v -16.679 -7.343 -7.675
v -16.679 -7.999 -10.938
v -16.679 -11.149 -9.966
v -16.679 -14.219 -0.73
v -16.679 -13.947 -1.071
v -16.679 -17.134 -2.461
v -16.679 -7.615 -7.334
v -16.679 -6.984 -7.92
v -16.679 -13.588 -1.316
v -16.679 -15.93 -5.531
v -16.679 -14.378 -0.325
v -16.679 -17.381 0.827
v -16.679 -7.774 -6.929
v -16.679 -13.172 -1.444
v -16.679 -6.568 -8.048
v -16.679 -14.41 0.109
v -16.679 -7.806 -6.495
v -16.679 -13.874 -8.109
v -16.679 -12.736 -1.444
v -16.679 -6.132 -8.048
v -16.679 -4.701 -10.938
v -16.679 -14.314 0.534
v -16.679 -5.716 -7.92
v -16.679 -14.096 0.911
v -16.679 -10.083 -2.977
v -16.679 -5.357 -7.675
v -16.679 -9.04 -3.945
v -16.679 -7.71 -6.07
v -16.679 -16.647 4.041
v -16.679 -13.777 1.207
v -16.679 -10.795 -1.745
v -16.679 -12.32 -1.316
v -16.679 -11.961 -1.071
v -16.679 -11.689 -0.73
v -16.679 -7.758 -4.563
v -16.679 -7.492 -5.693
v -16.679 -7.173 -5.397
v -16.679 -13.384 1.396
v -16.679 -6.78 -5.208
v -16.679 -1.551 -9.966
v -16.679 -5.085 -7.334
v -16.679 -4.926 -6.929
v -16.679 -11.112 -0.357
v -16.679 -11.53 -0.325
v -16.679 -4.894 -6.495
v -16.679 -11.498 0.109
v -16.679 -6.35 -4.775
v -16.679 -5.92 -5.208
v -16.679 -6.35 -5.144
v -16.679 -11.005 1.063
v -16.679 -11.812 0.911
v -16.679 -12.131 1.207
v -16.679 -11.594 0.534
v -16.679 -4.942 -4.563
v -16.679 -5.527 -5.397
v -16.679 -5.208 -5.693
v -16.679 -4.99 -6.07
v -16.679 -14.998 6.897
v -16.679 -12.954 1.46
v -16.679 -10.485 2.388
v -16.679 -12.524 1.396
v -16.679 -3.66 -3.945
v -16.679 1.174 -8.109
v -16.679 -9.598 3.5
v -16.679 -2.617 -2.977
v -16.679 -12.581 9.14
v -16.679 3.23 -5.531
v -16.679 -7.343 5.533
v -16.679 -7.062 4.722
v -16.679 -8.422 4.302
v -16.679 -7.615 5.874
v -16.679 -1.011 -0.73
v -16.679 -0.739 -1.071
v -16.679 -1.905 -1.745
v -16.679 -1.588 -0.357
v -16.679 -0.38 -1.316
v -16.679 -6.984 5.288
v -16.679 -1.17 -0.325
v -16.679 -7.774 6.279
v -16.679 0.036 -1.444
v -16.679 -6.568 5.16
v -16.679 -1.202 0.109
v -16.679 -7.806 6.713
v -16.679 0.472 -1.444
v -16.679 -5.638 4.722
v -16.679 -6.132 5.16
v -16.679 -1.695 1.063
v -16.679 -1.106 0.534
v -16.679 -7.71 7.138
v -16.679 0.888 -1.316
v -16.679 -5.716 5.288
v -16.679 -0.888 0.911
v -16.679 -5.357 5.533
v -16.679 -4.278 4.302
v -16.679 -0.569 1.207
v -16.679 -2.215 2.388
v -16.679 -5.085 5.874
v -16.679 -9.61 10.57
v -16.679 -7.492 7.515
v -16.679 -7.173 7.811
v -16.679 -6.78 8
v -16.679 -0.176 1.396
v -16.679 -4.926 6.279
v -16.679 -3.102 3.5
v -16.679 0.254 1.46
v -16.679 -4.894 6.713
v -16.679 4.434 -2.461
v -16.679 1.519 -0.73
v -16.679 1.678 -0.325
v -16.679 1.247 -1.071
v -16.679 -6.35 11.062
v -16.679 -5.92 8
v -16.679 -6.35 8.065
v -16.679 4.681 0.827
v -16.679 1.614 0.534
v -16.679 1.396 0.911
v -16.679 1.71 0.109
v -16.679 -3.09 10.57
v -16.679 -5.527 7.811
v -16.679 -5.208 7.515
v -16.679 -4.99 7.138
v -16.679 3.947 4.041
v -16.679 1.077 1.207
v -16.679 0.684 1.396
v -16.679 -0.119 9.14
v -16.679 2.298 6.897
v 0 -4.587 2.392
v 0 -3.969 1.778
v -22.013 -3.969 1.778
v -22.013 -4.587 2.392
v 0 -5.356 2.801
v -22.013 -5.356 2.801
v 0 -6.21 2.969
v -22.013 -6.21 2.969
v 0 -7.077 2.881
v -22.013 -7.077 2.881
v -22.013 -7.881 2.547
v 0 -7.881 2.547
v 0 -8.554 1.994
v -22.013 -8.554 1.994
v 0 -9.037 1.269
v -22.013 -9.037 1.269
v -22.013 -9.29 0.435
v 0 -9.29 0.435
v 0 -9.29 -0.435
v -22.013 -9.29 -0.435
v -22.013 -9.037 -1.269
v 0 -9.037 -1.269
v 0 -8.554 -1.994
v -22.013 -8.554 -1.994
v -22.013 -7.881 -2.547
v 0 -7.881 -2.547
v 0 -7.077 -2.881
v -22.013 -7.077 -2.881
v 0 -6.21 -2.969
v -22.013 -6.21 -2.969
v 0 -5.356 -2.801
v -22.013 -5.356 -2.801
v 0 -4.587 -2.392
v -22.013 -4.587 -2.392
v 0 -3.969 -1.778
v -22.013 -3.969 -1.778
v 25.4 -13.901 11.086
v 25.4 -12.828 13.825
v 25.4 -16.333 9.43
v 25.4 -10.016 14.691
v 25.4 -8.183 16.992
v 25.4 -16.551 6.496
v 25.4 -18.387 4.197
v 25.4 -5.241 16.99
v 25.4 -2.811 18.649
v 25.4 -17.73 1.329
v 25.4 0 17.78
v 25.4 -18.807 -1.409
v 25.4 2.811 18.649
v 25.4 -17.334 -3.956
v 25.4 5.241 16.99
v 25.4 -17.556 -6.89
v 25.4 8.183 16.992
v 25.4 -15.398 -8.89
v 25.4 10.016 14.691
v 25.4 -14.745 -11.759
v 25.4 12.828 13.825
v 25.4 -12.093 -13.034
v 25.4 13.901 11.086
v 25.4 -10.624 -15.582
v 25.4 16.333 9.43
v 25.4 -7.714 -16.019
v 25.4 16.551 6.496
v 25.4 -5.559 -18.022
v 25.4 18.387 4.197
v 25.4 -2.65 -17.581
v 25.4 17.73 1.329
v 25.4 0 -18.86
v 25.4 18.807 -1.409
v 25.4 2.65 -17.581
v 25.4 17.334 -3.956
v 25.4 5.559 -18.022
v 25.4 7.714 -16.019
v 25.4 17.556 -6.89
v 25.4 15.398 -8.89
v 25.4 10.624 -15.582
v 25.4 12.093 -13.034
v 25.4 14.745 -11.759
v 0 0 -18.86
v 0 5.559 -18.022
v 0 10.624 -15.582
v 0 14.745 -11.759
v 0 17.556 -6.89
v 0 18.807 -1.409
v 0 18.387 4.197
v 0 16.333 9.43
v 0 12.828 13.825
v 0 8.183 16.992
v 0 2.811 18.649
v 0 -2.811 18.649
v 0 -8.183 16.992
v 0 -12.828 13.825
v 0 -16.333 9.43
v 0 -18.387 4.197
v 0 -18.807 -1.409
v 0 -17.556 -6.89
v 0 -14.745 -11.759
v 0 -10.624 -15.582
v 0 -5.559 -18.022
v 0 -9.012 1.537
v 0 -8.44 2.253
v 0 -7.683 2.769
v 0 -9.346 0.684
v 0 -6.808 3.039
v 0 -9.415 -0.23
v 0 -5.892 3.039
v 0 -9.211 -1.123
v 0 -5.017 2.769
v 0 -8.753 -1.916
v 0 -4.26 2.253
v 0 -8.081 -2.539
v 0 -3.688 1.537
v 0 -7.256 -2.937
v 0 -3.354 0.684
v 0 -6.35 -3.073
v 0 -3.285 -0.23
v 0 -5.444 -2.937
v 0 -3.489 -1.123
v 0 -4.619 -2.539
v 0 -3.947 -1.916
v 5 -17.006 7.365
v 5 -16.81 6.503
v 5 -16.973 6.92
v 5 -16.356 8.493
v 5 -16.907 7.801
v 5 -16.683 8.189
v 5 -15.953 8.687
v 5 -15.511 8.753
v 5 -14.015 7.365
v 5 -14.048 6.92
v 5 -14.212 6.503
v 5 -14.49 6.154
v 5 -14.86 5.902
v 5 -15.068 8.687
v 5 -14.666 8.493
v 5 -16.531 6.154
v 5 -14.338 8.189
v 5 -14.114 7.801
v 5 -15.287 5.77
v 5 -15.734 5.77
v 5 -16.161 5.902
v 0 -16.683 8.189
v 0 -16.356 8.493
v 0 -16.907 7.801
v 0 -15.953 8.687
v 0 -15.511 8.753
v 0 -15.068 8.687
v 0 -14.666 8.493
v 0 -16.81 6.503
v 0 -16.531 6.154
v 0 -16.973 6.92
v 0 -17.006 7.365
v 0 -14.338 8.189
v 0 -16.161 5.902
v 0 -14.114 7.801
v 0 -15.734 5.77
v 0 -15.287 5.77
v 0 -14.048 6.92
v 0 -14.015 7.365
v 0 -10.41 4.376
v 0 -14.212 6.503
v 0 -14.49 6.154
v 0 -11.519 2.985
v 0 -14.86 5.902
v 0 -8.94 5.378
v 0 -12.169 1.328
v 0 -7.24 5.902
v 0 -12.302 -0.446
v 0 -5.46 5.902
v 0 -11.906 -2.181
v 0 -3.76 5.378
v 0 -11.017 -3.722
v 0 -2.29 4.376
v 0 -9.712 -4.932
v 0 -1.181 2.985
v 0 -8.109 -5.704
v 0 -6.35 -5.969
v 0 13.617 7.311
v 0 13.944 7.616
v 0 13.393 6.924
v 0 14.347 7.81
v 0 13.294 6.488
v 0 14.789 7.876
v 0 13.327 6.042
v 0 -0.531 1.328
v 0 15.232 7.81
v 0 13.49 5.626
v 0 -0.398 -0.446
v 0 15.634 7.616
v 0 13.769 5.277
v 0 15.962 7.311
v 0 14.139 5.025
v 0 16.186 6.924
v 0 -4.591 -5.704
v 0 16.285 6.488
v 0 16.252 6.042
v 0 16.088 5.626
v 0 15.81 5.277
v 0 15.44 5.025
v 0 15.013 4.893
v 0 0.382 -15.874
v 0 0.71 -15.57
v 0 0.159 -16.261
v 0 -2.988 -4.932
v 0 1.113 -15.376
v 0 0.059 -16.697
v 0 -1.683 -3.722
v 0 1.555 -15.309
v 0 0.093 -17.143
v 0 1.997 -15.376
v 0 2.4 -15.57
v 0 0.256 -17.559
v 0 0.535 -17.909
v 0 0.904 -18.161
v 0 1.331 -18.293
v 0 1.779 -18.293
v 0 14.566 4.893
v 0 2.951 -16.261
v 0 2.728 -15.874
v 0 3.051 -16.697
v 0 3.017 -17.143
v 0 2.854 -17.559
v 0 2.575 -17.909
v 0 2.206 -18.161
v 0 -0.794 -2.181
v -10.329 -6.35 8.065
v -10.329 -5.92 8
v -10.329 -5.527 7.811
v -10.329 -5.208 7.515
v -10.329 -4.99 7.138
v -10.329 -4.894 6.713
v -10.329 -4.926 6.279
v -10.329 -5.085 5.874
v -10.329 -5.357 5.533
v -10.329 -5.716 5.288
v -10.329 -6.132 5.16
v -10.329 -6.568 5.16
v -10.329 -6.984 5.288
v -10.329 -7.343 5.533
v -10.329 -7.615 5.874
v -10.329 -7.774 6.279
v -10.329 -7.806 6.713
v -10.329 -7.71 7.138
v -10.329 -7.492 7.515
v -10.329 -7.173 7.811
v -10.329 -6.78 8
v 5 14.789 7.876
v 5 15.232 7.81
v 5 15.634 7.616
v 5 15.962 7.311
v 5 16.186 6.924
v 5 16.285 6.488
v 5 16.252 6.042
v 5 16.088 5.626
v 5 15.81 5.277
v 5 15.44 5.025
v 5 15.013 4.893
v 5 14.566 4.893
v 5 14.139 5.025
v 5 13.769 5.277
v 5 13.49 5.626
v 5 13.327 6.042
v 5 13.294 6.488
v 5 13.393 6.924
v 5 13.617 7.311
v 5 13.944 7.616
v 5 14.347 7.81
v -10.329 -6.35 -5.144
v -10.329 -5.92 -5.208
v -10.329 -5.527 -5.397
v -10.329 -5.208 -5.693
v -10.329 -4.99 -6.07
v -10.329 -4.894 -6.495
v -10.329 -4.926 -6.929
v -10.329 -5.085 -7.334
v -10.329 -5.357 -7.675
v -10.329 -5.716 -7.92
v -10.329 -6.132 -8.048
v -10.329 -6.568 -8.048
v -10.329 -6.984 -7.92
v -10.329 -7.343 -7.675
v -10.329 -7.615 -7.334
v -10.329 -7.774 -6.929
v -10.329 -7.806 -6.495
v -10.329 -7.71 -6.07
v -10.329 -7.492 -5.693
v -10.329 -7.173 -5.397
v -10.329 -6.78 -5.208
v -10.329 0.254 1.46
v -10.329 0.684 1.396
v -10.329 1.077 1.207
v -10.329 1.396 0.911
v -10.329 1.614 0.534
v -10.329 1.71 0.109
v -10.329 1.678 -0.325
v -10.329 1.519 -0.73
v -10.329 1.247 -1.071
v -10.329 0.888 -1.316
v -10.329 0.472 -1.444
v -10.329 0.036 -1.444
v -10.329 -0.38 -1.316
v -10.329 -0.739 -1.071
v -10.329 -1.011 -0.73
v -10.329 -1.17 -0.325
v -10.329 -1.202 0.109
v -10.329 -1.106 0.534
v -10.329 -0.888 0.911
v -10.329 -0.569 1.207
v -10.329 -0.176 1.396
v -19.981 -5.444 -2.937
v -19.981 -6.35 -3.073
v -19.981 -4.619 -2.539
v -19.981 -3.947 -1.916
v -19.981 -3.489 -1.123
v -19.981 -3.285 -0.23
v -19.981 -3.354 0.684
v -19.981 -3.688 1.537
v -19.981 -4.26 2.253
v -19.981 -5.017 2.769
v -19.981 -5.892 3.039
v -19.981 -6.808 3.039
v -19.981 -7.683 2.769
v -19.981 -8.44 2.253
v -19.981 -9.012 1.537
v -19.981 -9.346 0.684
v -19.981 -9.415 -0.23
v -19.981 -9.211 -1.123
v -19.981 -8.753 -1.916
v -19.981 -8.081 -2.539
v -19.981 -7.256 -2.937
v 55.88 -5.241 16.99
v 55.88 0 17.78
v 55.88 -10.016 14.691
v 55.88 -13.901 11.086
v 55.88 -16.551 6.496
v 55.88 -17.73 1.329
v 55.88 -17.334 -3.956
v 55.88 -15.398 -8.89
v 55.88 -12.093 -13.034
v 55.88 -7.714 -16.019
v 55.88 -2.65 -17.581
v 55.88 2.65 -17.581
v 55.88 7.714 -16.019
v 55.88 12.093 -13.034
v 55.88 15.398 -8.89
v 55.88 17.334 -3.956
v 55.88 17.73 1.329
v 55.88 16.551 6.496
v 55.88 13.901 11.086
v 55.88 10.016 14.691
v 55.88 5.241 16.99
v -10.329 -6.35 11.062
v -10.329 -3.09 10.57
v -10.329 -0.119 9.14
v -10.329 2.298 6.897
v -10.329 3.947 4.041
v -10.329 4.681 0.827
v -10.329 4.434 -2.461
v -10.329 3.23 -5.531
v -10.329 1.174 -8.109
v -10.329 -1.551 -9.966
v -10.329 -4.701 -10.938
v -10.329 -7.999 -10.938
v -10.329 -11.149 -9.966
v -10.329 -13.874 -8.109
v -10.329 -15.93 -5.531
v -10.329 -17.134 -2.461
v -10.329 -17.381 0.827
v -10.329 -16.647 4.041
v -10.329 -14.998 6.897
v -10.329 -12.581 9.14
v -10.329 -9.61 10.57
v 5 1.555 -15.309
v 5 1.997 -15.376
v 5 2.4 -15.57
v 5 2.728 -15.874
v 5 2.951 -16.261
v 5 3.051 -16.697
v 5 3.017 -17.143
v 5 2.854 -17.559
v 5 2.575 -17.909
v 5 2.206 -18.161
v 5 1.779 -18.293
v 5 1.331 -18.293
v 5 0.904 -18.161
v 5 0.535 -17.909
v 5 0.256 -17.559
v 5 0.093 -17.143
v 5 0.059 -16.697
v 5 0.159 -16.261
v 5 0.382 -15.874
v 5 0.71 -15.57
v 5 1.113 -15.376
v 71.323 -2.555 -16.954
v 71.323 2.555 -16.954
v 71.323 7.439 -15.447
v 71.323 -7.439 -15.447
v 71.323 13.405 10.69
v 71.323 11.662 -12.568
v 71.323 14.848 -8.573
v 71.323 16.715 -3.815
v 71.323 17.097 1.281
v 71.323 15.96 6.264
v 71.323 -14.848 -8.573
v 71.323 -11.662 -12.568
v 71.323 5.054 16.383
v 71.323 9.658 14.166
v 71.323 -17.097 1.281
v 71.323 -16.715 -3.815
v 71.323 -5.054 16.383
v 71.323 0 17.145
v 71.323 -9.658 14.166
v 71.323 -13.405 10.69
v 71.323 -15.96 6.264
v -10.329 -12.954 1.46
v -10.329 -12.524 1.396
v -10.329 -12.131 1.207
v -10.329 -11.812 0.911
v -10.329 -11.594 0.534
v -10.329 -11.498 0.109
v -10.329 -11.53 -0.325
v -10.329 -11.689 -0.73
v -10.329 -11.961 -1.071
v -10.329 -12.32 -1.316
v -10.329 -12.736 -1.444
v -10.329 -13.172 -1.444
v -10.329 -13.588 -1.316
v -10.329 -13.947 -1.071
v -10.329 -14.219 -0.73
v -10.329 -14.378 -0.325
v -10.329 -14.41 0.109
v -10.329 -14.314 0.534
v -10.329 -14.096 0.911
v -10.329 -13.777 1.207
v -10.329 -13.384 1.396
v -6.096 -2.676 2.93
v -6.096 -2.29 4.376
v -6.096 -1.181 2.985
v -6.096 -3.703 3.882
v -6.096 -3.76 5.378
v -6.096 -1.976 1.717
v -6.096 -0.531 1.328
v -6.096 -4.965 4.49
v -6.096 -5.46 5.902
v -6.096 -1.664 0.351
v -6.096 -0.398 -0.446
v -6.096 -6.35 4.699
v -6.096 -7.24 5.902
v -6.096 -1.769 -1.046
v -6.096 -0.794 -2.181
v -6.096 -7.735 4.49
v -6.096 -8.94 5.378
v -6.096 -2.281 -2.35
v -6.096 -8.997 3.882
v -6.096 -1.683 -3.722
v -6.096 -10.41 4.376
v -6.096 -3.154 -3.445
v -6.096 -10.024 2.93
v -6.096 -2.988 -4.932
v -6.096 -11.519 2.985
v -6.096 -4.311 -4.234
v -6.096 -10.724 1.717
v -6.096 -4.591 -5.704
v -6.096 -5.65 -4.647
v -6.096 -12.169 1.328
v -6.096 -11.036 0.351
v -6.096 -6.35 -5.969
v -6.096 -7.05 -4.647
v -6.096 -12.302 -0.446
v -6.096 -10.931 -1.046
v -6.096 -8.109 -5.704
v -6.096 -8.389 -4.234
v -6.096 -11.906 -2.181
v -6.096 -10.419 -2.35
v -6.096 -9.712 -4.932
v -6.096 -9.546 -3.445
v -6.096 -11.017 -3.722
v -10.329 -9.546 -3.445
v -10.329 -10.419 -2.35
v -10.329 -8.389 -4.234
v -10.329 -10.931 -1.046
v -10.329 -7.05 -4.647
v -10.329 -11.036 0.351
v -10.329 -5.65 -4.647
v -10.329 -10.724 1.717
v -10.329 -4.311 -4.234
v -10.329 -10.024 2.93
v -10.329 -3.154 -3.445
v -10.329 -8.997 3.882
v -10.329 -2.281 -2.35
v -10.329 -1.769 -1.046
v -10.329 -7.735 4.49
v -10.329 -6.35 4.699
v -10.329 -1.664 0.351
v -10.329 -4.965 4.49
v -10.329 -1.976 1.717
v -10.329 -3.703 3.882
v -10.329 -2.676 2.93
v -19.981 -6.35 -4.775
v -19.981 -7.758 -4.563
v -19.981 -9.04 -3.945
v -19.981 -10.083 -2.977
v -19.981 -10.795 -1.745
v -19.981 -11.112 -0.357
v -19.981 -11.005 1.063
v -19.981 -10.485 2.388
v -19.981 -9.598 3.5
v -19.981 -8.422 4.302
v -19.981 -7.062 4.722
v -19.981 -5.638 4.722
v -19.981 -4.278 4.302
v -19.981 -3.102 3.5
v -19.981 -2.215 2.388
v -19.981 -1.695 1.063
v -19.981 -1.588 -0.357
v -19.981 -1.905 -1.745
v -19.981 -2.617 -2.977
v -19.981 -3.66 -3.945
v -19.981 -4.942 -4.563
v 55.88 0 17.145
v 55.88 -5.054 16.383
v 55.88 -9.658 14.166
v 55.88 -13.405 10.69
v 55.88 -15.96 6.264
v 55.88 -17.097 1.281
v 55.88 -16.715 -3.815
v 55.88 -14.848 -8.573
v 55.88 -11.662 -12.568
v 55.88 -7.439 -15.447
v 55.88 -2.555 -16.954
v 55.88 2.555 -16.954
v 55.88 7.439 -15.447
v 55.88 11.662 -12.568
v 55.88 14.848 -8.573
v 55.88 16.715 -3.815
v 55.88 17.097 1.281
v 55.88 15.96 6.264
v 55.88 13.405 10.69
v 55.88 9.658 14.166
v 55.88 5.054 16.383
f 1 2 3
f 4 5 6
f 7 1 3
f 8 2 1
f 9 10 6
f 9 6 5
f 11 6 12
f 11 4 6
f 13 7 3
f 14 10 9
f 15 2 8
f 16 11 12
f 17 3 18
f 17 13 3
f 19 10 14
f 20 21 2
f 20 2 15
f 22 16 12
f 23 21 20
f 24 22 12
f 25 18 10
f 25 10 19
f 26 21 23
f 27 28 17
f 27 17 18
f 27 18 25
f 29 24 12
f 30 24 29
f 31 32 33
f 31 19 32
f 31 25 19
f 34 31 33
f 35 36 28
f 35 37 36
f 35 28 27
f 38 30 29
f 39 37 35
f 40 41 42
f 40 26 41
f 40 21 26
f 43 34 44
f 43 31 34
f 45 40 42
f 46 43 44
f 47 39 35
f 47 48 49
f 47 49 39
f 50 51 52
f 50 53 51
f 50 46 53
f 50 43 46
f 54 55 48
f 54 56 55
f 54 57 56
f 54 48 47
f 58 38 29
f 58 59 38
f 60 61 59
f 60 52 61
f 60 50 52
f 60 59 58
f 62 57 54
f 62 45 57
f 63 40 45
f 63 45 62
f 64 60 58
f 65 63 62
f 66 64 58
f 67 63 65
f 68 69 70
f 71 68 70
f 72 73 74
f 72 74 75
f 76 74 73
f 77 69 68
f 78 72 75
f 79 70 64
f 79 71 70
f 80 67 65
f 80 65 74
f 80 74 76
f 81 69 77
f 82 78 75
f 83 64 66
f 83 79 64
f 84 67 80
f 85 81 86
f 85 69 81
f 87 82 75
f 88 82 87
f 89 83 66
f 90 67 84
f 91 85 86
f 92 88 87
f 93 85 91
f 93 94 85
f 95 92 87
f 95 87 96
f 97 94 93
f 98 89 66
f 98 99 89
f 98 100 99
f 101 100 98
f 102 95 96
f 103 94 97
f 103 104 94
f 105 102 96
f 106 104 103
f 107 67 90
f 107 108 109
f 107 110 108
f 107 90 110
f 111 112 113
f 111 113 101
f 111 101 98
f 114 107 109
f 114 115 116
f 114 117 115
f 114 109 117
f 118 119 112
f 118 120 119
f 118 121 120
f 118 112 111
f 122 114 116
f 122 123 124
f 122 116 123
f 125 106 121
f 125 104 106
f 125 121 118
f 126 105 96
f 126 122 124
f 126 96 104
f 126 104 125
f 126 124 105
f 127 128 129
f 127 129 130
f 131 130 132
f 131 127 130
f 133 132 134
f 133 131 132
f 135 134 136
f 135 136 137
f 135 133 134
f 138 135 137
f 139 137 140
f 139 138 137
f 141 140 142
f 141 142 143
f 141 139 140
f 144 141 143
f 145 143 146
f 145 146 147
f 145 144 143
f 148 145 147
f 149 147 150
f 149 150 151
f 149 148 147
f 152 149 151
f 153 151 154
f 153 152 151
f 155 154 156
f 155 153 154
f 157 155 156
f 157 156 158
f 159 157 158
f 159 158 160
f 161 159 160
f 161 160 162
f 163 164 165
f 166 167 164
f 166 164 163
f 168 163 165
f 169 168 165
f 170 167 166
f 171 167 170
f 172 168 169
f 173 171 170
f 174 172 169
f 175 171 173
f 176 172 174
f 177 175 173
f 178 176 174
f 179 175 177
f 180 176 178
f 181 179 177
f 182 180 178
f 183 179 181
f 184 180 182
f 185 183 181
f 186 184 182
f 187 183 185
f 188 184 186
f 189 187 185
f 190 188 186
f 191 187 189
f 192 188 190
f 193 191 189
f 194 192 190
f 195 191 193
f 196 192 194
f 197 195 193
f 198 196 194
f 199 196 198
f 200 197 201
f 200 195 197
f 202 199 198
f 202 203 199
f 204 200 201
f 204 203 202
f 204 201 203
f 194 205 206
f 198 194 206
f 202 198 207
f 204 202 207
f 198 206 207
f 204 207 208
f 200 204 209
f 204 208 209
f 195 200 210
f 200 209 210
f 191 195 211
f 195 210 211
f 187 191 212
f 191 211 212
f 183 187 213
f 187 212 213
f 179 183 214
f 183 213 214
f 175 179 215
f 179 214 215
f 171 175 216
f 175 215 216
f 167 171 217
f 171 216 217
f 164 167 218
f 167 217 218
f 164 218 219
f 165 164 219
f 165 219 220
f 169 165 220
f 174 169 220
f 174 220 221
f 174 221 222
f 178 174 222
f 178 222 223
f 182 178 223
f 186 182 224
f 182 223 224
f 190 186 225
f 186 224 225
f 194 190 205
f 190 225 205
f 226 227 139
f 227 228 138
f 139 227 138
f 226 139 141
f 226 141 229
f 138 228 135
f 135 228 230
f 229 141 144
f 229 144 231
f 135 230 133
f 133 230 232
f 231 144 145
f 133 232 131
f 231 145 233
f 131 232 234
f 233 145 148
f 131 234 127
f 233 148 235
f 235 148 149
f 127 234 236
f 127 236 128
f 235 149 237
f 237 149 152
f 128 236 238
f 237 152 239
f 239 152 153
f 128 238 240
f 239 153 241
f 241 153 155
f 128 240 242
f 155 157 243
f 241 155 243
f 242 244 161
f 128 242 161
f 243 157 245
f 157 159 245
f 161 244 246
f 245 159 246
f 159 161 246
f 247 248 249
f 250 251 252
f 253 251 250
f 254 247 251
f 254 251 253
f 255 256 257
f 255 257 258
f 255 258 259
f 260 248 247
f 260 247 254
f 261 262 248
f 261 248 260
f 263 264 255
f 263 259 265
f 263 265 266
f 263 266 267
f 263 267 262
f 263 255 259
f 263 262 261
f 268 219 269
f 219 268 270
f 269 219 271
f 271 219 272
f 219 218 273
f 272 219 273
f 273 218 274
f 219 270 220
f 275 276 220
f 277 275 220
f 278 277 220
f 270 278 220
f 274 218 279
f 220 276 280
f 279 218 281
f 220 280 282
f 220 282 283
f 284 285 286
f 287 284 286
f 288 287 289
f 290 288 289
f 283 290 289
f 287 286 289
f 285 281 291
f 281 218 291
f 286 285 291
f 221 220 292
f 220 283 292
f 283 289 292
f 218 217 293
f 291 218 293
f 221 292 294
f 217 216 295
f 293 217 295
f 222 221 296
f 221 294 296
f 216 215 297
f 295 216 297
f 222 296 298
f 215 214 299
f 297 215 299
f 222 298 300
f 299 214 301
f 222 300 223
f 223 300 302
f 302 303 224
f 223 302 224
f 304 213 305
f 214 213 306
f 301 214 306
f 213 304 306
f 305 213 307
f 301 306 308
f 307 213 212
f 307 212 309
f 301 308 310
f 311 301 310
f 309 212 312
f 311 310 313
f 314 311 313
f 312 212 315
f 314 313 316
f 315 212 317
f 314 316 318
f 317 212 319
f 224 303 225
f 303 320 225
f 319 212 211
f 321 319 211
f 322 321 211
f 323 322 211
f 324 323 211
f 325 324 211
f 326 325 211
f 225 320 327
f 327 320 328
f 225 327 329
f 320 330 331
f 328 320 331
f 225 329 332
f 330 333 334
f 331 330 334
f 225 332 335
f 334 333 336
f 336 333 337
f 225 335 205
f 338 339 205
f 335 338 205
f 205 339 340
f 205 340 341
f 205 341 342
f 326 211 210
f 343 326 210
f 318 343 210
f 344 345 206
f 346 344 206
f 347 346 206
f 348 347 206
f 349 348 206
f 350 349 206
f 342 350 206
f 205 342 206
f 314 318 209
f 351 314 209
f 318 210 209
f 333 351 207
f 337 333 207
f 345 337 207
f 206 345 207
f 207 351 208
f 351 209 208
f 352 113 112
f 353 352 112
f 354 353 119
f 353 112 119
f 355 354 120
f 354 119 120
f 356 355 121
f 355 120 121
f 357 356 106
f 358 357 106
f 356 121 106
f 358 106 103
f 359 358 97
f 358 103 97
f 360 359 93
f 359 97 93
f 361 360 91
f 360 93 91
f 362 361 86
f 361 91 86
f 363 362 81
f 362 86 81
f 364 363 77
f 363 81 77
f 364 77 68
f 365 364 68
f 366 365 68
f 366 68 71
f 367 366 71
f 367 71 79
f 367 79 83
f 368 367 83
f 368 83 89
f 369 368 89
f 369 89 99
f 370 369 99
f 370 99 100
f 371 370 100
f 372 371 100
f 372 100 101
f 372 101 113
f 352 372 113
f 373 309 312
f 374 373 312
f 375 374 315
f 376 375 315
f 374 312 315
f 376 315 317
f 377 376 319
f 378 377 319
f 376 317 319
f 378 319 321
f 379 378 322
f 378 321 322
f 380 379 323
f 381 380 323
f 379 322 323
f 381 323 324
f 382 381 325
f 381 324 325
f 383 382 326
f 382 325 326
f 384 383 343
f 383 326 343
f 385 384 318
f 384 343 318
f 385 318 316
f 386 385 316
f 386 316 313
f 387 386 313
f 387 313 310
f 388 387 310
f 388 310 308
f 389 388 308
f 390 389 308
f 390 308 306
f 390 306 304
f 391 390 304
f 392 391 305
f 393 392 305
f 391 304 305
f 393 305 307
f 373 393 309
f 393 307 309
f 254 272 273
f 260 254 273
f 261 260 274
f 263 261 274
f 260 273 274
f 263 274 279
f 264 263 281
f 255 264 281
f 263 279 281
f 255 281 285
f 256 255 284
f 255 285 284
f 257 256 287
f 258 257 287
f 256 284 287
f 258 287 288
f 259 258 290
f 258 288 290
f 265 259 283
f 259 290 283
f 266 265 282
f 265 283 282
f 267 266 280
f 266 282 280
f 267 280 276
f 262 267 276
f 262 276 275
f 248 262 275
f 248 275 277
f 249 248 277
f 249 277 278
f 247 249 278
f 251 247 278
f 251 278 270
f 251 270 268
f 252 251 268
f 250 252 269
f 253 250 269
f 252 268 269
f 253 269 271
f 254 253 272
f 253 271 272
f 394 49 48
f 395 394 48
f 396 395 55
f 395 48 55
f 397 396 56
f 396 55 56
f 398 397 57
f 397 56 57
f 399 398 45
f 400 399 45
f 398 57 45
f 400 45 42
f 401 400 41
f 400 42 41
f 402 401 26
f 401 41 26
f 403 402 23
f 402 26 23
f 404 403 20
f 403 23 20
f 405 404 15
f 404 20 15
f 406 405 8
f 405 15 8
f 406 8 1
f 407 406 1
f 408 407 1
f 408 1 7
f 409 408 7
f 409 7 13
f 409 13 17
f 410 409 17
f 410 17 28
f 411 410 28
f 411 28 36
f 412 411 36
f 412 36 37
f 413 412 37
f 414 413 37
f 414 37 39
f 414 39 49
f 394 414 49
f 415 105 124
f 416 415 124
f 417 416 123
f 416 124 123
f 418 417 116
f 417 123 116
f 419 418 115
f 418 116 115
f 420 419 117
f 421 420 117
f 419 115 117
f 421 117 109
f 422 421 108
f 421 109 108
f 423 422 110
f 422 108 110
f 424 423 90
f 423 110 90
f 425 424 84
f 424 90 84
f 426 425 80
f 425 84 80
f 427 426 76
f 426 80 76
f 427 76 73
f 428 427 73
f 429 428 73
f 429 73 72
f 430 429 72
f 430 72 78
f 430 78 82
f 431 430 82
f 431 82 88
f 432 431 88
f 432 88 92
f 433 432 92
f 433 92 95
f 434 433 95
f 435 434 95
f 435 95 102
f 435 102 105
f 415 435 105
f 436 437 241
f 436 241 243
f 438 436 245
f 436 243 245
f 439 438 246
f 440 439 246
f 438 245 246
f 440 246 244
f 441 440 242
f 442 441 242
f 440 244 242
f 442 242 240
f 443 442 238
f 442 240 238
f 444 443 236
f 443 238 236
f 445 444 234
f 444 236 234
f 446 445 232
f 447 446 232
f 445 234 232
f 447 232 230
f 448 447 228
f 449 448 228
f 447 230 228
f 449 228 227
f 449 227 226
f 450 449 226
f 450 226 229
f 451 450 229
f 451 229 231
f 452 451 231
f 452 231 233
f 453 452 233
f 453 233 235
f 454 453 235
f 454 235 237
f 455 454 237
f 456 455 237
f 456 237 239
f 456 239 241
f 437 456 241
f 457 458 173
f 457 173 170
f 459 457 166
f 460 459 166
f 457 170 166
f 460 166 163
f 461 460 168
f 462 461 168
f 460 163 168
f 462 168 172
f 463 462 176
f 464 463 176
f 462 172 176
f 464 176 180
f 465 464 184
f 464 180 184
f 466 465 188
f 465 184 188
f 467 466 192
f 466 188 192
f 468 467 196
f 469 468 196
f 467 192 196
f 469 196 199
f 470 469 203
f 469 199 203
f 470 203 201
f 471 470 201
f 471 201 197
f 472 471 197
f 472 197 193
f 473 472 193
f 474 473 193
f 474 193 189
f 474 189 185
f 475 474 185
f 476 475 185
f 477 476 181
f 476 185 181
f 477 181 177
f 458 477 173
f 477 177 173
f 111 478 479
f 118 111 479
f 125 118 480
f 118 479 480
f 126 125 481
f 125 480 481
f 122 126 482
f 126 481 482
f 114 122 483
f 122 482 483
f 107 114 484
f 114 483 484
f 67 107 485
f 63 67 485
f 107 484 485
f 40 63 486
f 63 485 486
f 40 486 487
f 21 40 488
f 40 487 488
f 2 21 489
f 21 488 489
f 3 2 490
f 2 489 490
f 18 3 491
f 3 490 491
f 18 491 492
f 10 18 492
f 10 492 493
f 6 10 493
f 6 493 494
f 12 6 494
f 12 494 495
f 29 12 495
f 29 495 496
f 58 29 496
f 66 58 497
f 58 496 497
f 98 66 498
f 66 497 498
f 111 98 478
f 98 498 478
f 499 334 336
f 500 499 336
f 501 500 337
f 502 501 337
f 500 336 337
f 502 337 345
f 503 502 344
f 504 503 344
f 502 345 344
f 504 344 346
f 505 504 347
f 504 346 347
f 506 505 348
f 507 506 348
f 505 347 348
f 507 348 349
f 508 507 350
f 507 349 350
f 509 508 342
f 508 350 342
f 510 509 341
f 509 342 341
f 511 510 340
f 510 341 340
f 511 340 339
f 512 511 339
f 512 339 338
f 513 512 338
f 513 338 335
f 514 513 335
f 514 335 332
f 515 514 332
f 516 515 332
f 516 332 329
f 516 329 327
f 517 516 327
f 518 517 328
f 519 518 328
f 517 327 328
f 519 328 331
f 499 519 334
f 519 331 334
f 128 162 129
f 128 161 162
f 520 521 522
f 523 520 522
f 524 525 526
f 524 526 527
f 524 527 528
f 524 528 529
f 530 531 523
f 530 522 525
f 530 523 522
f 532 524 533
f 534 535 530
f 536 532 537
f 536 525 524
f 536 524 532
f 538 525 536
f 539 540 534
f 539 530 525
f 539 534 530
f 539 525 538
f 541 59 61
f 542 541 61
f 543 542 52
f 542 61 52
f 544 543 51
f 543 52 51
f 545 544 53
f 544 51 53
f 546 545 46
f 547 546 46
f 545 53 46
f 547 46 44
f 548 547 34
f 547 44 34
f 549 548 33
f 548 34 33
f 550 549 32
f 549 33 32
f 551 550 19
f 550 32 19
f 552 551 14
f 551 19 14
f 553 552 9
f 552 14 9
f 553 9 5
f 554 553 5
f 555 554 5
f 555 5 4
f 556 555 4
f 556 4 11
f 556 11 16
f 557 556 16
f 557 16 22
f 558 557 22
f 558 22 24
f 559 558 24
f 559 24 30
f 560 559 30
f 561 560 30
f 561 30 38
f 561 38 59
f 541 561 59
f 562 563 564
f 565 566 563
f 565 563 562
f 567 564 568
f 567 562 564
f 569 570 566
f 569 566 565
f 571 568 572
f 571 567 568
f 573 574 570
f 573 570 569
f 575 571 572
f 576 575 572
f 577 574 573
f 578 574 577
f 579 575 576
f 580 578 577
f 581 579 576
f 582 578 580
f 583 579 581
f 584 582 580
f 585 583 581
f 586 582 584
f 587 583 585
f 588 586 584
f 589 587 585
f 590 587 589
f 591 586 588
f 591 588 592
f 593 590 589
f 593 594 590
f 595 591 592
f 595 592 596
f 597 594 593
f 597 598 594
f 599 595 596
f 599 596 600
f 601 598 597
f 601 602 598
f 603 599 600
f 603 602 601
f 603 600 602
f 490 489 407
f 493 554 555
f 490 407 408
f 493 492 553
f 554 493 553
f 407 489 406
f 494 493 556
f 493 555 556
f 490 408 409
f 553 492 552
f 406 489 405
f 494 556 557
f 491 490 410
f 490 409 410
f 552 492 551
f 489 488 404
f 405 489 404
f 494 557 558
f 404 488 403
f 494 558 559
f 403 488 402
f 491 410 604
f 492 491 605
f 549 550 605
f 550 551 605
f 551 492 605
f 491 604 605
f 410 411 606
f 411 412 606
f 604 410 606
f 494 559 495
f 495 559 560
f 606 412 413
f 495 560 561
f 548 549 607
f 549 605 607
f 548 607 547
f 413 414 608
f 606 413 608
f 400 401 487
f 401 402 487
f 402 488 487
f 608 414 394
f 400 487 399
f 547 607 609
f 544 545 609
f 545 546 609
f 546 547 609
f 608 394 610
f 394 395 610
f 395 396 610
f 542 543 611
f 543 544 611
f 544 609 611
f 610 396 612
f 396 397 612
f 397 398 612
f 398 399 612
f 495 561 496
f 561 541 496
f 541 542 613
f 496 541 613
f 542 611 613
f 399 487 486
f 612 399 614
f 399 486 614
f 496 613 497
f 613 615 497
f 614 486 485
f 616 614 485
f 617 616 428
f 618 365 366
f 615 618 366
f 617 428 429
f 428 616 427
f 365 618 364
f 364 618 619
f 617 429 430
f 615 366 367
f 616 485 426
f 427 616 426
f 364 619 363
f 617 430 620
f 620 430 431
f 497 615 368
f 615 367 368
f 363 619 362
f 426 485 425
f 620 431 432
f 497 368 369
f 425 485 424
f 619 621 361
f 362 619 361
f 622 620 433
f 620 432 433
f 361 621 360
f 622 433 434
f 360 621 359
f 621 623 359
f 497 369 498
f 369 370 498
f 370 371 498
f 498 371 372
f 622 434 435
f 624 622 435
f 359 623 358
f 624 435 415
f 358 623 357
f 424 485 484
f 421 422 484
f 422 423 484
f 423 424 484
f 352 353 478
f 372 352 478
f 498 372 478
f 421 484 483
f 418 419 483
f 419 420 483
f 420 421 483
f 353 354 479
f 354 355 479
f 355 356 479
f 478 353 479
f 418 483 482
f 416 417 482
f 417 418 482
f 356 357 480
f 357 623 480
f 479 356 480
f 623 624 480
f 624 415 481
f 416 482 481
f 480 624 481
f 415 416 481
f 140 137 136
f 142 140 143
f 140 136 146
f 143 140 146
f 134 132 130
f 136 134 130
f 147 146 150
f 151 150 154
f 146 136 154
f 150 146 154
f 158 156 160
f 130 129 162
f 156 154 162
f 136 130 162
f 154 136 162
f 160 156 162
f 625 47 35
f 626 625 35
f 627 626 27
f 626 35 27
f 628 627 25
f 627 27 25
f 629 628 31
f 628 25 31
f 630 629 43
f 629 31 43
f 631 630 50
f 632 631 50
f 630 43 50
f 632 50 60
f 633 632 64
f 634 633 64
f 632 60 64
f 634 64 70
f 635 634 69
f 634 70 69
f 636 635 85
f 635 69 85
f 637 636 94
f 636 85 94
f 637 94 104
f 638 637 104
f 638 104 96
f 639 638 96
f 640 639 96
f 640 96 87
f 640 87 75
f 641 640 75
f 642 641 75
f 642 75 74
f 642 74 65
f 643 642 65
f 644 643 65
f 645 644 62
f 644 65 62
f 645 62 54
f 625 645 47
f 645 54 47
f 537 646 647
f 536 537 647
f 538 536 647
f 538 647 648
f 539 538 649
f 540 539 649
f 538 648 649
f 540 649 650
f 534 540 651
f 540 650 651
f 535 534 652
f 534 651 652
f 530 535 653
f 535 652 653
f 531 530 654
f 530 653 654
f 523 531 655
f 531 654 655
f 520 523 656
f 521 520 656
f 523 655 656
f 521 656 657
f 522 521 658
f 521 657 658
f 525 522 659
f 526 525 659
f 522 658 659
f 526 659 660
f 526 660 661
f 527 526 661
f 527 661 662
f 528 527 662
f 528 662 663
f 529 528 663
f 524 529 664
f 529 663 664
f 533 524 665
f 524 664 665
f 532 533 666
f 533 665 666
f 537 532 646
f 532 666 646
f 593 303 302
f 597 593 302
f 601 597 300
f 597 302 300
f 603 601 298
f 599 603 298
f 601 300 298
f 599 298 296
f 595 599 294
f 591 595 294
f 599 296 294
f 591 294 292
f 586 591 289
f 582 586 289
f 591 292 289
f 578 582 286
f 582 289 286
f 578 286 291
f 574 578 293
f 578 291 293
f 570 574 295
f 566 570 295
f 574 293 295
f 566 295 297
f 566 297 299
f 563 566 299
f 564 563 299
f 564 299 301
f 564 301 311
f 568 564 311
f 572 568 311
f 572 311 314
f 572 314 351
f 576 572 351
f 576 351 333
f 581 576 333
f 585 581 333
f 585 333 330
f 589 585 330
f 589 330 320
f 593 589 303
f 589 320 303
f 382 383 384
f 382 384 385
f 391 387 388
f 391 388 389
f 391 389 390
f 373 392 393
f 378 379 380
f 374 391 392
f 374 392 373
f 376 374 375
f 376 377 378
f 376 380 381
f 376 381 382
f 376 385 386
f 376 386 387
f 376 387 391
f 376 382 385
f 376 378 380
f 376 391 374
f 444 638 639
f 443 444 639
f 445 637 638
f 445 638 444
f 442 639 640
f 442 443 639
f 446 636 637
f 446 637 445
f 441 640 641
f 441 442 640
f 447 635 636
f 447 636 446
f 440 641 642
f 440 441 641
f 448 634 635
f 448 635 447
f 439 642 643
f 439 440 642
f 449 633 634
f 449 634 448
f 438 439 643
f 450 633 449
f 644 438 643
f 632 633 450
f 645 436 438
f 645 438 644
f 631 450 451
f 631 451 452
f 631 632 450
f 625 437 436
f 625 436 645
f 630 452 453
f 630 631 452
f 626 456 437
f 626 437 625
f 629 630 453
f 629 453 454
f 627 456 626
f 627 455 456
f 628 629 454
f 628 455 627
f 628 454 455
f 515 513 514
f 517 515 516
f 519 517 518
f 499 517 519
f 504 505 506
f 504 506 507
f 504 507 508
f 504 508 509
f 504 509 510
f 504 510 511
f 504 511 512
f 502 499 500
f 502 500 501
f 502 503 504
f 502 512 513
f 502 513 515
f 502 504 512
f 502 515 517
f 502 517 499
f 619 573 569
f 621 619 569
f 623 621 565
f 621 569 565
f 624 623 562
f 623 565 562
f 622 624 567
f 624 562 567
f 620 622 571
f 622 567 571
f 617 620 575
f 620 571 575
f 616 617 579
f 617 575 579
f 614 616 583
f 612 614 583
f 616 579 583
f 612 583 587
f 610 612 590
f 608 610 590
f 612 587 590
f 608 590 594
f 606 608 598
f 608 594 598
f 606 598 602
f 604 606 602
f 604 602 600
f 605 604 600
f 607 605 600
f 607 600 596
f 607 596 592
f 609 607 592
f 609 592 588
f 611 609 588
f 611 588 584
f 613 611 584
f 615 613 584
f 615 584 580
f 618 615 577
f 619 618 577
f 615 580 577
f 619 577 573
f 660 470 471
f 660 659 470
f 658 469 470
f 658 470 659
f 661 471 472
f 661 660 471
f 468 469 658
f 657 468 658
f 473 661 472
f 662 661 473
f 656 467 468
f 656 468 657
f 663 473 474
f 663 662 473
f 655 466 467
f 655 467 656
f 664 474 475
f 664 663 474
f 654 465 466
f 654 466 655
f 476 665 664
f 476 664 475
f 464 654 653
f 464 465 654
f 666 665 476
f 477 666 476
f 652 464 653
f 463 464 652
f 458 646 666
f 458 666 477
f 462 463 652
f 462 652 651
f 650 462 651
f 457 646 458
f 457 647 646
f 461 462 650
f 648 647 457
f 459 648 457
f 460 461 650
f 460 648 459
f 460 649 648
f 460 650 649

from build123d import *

# Parameters (mm, degrees)
ESQUISSE6_R                                   = 18.8595
BOSS_EXTRU_2_DEPTH                            = 25.4
ESQUISSE7_R                                   = 17.78
BOSS_EXTRU_3_DEPTH                            = 30.48
ESQUISSE8_R                                   = 17.145
BOSS_EXTRU_4_DEPTH                            = 15.4432
ESQUISSE9_R                                   = 5.969
BOSS_EXTRU_5_DEPTH                            = 6.096
ESQUISSE10_R                                  = 4.699
BOSS_EXTRU_6_DEPTH                            = 4.233333333
ESQUISSE11_R                                  = 11.0617
BOSS_EXTRU_7_DEPTH                            = 6.35
ESQUISSE12_R                                  = 4.7752
BOSS_EXTRU_8_DEPTH                            = 3.302
PER_AGE_POUR_TUYAU_POUR_TROU_TARAUD_1_1_D     = 6.1468
PER_AGE_POUR_TUYAU_POUR_TROU_TARAUD_1_1_DEPTH = 19.981333333
BOSS_EXTRU_9_DEPTH                            = 19.981333333
BOSS_EXTRU_10_DEPTH                           = 2.032
ENL_V_MAT_EXTRU_2_REACH                       = 93.955
ESQUISSE18_R                                  = 1.4605
ESQUISSE19_R                                  = 1.5
ESQUISSE19_R_2                                = 1.500000048
ENL_V_MAT_EXTRU_3_DEPTH                       = 5


with BuildPart() as part:
    # Esquisse6 → Boss.-Extru.2 (new body)
    with BuildSketch(Plane(origin=(0, 0, 0), x_dir=(0, 0, -1), z_dir=(1, 0, 0))):
        Circle(ESQUISSE6_R)
    extrude(amount=BOSS_EXTRU_2_DEPTH)

    # Esquisse7 → Boss.-Extru.3 (add)
    with BuildSketch(Plane(origin=(25.4, 0, 0), x_dir=(0, 0, -1), z_dir=(1, 0, 0))):
        with Locations(Location((0, 0, 0), (0, 0, 180))):
            Circle(ESQUISSE7_R)
    extrude(amount=BOSS_EXTRU_3_DEPTH)

    # Esquisse8 → Boss.-Extru.4 (add)
    with BuildSketch(Plane(origin=(55.88, 0, 0), x_dir=(0, 0, -1), z_dir=(1, 0, 0))):
        with Locations(Location((0, 0, 0), (0, 0, 180))):
            Circle(ESQUISSE8_R)
    extrude(amount=BOSS_EXTRU_4_DEPTH)

    # Esquisse9 → Boss.-Extru.5 (add)
    with BuildSketch(Plane.ZY):
        with Locations(Location((0, -6.35, 0), (0, 0, 180))):
            Circle(ESQUISSE9_R)
    extrude(amount=BOSS_EXTRU_5_DEPTH)

    # Esquisse10 → Boss.-Extru.6 (add)
    with BuildSketch(Plane.ZY.offset(6.096)):
        with Locations((0, -6.35)):
            Circle(ESQUISSE10_R)
    extrude(amount=BOSS_EXTRU_6_DEPTH)

    # Esquisse11 → Boss.-Extru.7 (add)
    with BuildSketch(Plane.ZY.offset(10.329333333)):
        with Locations((0, -6.35)):
            Circle(ESQUISSE11_R)
    extrude(amount=BOSS_EXTRU_7_DEPTH)

    # Esquisse12 → Boss.-Extru.8 (add)
    with BuildSketch(Plane.ZY.offset(16.679333333)):
        with Locations(Location((0, -6.35, 0), (0, 0, 180))):
            Circle(ESQUISSE12_R)
    extrude(amount=BOSS_EXTRU_8_DEPTH)

    # Perçage pour tuyau pour trou taraudé 1/161
    with Locations(Plane.ZY.offset(19.981333333)):
        with Locations((0, -6.35)):
            Hole(PER_AGE_POUR_TUYAU_POUR_TROU_TARAUD_1_1_D / 2, depth=PER_AGE_POUR_TUYAU_POUR_TROU_TARAUD_1_1_DEPTH)

    # Esquisse16 → Boss.-Extru.9 (add)
    with BuildSketch(Plane.ZY):
        with BuildLine():
            Line((-1.778, -3.968758467), (1.778, -3.968758467))
            ThreePointArc((1.778, -3.968758467), (0, -9.3218), (-1.778, -3.968758467))
        make_face()
    extrude(amount=BOSS_EXTRU_9_DEPTH)

    # Esquisse17 → Boss.-Extru.10 (add)
    with BuildSketch(Plane.ZY.offset(19.981333333)):
        with BuildLine():
            Line((-1.778, -3.968758467), (1.778, -3.968758467))
            ThreePointArc((1.778, -3.968758467), (0, -9.3218), (-1.778, -3.968758467))
        make_face()
    extrude(amount=BOSS_EXTRU_10_DEPTH)

    # Esquisse18 → Enlèv. mat.-Extru.2 (cut, up to next)
    with BuildSketch(Plane.ZY.offset(16.679333333), mode=Mode.PRIVATE) as enl_v_mat_extru_2_sk1:
        with Locations((0, 0.254)):
            Circle(ESQUISSE18_R)
    enl_v_mat_extru_2_tool1 = extrude(enl_v_mat_extru_2_sk1.sketch, amount=-ENL_V_MAT_EXTRU_2_REACH, mode=Mode.PRIVATE) & part.part
    # Esquisse18 → Enlèv. mat.-Extru.2 (cut, up to next)
    with BuildSketch(Plane.ZY.offset(16.679333333), mode=Mode.PRIVATE) as enl_v_mat_extru_2_sk2:
        with Locations((6.604, -6.35)):
            Circle(ESQUISSE18_R)
    enl_v_mat_extru_2_tool2 = extrude(enl_v_mat_extru_2_sk2.sketch, amount=-ENL_V_MAT_EXTRU_2_REACH, mode=Mode.PRIVATE) & part.part
    # Esquisse18 → Enlèv. mat.-Extru.2 (cut, up to next)
    with BuildSketch(Plane.ZY.offset(16.679333333), mode=Mode.PRIVATE) as enl_v_mat_extru_2_sk3:
        with Locations((0, -12.954)):
            Circle(ESQUISSE18_R)
    enl_v_mat_extru_2_tool3 = extrude(enl_v_mat_extru_2_sk3.sketch, amount=-ENL_V_MAT_EXTRU_2_REACH, mode=Mode.PRIVATE) & part.part
    # Esquisse18 → Enlèv. mat.-Extru.2 (cut, up to next)
    with BuildSketch(Plane.ZY.offset(16.679333333), mode=Mode.PRIVATE) as enl_v_mat_extru_2_sk4:
        with Locations((-6.604, -6.35)):
            Circle(ESQUISSE18_R)
    enl_v_mat_extru_2_tool4 = extrude(enl_v_mat_extru_2_sk4.sketch, amount=-ENL_V_MAT_EXTRU_2_REACH, mode=Mode.PRIVATE) & part.part
    add(enl_v_mat_extru_2_tool1.solids().sort_by_distance((-16.679333, 0.254, 0))[0], mode=Mode.SUBTRACT)
    add(enl_v_mat_extru_2_tool2.solids().sort_by_distance((-16.679333, -6.35, 6.604))[0], mode=Mode.SUBTRACT)
    add(enl_v_mat_extru_2_tool3.solids().sort_by_distance((-16.679333, -12.954, 0))[0], mode=Mode.SUBTRACT)
    add(enl_v_mat_extru_2_tool4.solids().sort_by_distance((-16.679333, -6.35, -6.604))[0], mode=Mode.SUBTRACT)

    # Esquisse19 → Enlèv. mat.-Extru.3 (cut)
    with BuildSketch(Plane.ZY):
        with Locations((6.376248943, 14.789374018)):
            Circle(ESQUISSE19_R)
        with Locations((7.253318149, -15.510625982)):
            Circle(ESQUISSE19_R_2)
        with Locations((-16.809397398, 1.555003695)):
            Circle(ESQUISSE19_R_2)
    extrude(amount=-ENL_V_MAT_EXTRU_3_DEPTH, mode=Mode.SUBTRACT)


solid = part.part
